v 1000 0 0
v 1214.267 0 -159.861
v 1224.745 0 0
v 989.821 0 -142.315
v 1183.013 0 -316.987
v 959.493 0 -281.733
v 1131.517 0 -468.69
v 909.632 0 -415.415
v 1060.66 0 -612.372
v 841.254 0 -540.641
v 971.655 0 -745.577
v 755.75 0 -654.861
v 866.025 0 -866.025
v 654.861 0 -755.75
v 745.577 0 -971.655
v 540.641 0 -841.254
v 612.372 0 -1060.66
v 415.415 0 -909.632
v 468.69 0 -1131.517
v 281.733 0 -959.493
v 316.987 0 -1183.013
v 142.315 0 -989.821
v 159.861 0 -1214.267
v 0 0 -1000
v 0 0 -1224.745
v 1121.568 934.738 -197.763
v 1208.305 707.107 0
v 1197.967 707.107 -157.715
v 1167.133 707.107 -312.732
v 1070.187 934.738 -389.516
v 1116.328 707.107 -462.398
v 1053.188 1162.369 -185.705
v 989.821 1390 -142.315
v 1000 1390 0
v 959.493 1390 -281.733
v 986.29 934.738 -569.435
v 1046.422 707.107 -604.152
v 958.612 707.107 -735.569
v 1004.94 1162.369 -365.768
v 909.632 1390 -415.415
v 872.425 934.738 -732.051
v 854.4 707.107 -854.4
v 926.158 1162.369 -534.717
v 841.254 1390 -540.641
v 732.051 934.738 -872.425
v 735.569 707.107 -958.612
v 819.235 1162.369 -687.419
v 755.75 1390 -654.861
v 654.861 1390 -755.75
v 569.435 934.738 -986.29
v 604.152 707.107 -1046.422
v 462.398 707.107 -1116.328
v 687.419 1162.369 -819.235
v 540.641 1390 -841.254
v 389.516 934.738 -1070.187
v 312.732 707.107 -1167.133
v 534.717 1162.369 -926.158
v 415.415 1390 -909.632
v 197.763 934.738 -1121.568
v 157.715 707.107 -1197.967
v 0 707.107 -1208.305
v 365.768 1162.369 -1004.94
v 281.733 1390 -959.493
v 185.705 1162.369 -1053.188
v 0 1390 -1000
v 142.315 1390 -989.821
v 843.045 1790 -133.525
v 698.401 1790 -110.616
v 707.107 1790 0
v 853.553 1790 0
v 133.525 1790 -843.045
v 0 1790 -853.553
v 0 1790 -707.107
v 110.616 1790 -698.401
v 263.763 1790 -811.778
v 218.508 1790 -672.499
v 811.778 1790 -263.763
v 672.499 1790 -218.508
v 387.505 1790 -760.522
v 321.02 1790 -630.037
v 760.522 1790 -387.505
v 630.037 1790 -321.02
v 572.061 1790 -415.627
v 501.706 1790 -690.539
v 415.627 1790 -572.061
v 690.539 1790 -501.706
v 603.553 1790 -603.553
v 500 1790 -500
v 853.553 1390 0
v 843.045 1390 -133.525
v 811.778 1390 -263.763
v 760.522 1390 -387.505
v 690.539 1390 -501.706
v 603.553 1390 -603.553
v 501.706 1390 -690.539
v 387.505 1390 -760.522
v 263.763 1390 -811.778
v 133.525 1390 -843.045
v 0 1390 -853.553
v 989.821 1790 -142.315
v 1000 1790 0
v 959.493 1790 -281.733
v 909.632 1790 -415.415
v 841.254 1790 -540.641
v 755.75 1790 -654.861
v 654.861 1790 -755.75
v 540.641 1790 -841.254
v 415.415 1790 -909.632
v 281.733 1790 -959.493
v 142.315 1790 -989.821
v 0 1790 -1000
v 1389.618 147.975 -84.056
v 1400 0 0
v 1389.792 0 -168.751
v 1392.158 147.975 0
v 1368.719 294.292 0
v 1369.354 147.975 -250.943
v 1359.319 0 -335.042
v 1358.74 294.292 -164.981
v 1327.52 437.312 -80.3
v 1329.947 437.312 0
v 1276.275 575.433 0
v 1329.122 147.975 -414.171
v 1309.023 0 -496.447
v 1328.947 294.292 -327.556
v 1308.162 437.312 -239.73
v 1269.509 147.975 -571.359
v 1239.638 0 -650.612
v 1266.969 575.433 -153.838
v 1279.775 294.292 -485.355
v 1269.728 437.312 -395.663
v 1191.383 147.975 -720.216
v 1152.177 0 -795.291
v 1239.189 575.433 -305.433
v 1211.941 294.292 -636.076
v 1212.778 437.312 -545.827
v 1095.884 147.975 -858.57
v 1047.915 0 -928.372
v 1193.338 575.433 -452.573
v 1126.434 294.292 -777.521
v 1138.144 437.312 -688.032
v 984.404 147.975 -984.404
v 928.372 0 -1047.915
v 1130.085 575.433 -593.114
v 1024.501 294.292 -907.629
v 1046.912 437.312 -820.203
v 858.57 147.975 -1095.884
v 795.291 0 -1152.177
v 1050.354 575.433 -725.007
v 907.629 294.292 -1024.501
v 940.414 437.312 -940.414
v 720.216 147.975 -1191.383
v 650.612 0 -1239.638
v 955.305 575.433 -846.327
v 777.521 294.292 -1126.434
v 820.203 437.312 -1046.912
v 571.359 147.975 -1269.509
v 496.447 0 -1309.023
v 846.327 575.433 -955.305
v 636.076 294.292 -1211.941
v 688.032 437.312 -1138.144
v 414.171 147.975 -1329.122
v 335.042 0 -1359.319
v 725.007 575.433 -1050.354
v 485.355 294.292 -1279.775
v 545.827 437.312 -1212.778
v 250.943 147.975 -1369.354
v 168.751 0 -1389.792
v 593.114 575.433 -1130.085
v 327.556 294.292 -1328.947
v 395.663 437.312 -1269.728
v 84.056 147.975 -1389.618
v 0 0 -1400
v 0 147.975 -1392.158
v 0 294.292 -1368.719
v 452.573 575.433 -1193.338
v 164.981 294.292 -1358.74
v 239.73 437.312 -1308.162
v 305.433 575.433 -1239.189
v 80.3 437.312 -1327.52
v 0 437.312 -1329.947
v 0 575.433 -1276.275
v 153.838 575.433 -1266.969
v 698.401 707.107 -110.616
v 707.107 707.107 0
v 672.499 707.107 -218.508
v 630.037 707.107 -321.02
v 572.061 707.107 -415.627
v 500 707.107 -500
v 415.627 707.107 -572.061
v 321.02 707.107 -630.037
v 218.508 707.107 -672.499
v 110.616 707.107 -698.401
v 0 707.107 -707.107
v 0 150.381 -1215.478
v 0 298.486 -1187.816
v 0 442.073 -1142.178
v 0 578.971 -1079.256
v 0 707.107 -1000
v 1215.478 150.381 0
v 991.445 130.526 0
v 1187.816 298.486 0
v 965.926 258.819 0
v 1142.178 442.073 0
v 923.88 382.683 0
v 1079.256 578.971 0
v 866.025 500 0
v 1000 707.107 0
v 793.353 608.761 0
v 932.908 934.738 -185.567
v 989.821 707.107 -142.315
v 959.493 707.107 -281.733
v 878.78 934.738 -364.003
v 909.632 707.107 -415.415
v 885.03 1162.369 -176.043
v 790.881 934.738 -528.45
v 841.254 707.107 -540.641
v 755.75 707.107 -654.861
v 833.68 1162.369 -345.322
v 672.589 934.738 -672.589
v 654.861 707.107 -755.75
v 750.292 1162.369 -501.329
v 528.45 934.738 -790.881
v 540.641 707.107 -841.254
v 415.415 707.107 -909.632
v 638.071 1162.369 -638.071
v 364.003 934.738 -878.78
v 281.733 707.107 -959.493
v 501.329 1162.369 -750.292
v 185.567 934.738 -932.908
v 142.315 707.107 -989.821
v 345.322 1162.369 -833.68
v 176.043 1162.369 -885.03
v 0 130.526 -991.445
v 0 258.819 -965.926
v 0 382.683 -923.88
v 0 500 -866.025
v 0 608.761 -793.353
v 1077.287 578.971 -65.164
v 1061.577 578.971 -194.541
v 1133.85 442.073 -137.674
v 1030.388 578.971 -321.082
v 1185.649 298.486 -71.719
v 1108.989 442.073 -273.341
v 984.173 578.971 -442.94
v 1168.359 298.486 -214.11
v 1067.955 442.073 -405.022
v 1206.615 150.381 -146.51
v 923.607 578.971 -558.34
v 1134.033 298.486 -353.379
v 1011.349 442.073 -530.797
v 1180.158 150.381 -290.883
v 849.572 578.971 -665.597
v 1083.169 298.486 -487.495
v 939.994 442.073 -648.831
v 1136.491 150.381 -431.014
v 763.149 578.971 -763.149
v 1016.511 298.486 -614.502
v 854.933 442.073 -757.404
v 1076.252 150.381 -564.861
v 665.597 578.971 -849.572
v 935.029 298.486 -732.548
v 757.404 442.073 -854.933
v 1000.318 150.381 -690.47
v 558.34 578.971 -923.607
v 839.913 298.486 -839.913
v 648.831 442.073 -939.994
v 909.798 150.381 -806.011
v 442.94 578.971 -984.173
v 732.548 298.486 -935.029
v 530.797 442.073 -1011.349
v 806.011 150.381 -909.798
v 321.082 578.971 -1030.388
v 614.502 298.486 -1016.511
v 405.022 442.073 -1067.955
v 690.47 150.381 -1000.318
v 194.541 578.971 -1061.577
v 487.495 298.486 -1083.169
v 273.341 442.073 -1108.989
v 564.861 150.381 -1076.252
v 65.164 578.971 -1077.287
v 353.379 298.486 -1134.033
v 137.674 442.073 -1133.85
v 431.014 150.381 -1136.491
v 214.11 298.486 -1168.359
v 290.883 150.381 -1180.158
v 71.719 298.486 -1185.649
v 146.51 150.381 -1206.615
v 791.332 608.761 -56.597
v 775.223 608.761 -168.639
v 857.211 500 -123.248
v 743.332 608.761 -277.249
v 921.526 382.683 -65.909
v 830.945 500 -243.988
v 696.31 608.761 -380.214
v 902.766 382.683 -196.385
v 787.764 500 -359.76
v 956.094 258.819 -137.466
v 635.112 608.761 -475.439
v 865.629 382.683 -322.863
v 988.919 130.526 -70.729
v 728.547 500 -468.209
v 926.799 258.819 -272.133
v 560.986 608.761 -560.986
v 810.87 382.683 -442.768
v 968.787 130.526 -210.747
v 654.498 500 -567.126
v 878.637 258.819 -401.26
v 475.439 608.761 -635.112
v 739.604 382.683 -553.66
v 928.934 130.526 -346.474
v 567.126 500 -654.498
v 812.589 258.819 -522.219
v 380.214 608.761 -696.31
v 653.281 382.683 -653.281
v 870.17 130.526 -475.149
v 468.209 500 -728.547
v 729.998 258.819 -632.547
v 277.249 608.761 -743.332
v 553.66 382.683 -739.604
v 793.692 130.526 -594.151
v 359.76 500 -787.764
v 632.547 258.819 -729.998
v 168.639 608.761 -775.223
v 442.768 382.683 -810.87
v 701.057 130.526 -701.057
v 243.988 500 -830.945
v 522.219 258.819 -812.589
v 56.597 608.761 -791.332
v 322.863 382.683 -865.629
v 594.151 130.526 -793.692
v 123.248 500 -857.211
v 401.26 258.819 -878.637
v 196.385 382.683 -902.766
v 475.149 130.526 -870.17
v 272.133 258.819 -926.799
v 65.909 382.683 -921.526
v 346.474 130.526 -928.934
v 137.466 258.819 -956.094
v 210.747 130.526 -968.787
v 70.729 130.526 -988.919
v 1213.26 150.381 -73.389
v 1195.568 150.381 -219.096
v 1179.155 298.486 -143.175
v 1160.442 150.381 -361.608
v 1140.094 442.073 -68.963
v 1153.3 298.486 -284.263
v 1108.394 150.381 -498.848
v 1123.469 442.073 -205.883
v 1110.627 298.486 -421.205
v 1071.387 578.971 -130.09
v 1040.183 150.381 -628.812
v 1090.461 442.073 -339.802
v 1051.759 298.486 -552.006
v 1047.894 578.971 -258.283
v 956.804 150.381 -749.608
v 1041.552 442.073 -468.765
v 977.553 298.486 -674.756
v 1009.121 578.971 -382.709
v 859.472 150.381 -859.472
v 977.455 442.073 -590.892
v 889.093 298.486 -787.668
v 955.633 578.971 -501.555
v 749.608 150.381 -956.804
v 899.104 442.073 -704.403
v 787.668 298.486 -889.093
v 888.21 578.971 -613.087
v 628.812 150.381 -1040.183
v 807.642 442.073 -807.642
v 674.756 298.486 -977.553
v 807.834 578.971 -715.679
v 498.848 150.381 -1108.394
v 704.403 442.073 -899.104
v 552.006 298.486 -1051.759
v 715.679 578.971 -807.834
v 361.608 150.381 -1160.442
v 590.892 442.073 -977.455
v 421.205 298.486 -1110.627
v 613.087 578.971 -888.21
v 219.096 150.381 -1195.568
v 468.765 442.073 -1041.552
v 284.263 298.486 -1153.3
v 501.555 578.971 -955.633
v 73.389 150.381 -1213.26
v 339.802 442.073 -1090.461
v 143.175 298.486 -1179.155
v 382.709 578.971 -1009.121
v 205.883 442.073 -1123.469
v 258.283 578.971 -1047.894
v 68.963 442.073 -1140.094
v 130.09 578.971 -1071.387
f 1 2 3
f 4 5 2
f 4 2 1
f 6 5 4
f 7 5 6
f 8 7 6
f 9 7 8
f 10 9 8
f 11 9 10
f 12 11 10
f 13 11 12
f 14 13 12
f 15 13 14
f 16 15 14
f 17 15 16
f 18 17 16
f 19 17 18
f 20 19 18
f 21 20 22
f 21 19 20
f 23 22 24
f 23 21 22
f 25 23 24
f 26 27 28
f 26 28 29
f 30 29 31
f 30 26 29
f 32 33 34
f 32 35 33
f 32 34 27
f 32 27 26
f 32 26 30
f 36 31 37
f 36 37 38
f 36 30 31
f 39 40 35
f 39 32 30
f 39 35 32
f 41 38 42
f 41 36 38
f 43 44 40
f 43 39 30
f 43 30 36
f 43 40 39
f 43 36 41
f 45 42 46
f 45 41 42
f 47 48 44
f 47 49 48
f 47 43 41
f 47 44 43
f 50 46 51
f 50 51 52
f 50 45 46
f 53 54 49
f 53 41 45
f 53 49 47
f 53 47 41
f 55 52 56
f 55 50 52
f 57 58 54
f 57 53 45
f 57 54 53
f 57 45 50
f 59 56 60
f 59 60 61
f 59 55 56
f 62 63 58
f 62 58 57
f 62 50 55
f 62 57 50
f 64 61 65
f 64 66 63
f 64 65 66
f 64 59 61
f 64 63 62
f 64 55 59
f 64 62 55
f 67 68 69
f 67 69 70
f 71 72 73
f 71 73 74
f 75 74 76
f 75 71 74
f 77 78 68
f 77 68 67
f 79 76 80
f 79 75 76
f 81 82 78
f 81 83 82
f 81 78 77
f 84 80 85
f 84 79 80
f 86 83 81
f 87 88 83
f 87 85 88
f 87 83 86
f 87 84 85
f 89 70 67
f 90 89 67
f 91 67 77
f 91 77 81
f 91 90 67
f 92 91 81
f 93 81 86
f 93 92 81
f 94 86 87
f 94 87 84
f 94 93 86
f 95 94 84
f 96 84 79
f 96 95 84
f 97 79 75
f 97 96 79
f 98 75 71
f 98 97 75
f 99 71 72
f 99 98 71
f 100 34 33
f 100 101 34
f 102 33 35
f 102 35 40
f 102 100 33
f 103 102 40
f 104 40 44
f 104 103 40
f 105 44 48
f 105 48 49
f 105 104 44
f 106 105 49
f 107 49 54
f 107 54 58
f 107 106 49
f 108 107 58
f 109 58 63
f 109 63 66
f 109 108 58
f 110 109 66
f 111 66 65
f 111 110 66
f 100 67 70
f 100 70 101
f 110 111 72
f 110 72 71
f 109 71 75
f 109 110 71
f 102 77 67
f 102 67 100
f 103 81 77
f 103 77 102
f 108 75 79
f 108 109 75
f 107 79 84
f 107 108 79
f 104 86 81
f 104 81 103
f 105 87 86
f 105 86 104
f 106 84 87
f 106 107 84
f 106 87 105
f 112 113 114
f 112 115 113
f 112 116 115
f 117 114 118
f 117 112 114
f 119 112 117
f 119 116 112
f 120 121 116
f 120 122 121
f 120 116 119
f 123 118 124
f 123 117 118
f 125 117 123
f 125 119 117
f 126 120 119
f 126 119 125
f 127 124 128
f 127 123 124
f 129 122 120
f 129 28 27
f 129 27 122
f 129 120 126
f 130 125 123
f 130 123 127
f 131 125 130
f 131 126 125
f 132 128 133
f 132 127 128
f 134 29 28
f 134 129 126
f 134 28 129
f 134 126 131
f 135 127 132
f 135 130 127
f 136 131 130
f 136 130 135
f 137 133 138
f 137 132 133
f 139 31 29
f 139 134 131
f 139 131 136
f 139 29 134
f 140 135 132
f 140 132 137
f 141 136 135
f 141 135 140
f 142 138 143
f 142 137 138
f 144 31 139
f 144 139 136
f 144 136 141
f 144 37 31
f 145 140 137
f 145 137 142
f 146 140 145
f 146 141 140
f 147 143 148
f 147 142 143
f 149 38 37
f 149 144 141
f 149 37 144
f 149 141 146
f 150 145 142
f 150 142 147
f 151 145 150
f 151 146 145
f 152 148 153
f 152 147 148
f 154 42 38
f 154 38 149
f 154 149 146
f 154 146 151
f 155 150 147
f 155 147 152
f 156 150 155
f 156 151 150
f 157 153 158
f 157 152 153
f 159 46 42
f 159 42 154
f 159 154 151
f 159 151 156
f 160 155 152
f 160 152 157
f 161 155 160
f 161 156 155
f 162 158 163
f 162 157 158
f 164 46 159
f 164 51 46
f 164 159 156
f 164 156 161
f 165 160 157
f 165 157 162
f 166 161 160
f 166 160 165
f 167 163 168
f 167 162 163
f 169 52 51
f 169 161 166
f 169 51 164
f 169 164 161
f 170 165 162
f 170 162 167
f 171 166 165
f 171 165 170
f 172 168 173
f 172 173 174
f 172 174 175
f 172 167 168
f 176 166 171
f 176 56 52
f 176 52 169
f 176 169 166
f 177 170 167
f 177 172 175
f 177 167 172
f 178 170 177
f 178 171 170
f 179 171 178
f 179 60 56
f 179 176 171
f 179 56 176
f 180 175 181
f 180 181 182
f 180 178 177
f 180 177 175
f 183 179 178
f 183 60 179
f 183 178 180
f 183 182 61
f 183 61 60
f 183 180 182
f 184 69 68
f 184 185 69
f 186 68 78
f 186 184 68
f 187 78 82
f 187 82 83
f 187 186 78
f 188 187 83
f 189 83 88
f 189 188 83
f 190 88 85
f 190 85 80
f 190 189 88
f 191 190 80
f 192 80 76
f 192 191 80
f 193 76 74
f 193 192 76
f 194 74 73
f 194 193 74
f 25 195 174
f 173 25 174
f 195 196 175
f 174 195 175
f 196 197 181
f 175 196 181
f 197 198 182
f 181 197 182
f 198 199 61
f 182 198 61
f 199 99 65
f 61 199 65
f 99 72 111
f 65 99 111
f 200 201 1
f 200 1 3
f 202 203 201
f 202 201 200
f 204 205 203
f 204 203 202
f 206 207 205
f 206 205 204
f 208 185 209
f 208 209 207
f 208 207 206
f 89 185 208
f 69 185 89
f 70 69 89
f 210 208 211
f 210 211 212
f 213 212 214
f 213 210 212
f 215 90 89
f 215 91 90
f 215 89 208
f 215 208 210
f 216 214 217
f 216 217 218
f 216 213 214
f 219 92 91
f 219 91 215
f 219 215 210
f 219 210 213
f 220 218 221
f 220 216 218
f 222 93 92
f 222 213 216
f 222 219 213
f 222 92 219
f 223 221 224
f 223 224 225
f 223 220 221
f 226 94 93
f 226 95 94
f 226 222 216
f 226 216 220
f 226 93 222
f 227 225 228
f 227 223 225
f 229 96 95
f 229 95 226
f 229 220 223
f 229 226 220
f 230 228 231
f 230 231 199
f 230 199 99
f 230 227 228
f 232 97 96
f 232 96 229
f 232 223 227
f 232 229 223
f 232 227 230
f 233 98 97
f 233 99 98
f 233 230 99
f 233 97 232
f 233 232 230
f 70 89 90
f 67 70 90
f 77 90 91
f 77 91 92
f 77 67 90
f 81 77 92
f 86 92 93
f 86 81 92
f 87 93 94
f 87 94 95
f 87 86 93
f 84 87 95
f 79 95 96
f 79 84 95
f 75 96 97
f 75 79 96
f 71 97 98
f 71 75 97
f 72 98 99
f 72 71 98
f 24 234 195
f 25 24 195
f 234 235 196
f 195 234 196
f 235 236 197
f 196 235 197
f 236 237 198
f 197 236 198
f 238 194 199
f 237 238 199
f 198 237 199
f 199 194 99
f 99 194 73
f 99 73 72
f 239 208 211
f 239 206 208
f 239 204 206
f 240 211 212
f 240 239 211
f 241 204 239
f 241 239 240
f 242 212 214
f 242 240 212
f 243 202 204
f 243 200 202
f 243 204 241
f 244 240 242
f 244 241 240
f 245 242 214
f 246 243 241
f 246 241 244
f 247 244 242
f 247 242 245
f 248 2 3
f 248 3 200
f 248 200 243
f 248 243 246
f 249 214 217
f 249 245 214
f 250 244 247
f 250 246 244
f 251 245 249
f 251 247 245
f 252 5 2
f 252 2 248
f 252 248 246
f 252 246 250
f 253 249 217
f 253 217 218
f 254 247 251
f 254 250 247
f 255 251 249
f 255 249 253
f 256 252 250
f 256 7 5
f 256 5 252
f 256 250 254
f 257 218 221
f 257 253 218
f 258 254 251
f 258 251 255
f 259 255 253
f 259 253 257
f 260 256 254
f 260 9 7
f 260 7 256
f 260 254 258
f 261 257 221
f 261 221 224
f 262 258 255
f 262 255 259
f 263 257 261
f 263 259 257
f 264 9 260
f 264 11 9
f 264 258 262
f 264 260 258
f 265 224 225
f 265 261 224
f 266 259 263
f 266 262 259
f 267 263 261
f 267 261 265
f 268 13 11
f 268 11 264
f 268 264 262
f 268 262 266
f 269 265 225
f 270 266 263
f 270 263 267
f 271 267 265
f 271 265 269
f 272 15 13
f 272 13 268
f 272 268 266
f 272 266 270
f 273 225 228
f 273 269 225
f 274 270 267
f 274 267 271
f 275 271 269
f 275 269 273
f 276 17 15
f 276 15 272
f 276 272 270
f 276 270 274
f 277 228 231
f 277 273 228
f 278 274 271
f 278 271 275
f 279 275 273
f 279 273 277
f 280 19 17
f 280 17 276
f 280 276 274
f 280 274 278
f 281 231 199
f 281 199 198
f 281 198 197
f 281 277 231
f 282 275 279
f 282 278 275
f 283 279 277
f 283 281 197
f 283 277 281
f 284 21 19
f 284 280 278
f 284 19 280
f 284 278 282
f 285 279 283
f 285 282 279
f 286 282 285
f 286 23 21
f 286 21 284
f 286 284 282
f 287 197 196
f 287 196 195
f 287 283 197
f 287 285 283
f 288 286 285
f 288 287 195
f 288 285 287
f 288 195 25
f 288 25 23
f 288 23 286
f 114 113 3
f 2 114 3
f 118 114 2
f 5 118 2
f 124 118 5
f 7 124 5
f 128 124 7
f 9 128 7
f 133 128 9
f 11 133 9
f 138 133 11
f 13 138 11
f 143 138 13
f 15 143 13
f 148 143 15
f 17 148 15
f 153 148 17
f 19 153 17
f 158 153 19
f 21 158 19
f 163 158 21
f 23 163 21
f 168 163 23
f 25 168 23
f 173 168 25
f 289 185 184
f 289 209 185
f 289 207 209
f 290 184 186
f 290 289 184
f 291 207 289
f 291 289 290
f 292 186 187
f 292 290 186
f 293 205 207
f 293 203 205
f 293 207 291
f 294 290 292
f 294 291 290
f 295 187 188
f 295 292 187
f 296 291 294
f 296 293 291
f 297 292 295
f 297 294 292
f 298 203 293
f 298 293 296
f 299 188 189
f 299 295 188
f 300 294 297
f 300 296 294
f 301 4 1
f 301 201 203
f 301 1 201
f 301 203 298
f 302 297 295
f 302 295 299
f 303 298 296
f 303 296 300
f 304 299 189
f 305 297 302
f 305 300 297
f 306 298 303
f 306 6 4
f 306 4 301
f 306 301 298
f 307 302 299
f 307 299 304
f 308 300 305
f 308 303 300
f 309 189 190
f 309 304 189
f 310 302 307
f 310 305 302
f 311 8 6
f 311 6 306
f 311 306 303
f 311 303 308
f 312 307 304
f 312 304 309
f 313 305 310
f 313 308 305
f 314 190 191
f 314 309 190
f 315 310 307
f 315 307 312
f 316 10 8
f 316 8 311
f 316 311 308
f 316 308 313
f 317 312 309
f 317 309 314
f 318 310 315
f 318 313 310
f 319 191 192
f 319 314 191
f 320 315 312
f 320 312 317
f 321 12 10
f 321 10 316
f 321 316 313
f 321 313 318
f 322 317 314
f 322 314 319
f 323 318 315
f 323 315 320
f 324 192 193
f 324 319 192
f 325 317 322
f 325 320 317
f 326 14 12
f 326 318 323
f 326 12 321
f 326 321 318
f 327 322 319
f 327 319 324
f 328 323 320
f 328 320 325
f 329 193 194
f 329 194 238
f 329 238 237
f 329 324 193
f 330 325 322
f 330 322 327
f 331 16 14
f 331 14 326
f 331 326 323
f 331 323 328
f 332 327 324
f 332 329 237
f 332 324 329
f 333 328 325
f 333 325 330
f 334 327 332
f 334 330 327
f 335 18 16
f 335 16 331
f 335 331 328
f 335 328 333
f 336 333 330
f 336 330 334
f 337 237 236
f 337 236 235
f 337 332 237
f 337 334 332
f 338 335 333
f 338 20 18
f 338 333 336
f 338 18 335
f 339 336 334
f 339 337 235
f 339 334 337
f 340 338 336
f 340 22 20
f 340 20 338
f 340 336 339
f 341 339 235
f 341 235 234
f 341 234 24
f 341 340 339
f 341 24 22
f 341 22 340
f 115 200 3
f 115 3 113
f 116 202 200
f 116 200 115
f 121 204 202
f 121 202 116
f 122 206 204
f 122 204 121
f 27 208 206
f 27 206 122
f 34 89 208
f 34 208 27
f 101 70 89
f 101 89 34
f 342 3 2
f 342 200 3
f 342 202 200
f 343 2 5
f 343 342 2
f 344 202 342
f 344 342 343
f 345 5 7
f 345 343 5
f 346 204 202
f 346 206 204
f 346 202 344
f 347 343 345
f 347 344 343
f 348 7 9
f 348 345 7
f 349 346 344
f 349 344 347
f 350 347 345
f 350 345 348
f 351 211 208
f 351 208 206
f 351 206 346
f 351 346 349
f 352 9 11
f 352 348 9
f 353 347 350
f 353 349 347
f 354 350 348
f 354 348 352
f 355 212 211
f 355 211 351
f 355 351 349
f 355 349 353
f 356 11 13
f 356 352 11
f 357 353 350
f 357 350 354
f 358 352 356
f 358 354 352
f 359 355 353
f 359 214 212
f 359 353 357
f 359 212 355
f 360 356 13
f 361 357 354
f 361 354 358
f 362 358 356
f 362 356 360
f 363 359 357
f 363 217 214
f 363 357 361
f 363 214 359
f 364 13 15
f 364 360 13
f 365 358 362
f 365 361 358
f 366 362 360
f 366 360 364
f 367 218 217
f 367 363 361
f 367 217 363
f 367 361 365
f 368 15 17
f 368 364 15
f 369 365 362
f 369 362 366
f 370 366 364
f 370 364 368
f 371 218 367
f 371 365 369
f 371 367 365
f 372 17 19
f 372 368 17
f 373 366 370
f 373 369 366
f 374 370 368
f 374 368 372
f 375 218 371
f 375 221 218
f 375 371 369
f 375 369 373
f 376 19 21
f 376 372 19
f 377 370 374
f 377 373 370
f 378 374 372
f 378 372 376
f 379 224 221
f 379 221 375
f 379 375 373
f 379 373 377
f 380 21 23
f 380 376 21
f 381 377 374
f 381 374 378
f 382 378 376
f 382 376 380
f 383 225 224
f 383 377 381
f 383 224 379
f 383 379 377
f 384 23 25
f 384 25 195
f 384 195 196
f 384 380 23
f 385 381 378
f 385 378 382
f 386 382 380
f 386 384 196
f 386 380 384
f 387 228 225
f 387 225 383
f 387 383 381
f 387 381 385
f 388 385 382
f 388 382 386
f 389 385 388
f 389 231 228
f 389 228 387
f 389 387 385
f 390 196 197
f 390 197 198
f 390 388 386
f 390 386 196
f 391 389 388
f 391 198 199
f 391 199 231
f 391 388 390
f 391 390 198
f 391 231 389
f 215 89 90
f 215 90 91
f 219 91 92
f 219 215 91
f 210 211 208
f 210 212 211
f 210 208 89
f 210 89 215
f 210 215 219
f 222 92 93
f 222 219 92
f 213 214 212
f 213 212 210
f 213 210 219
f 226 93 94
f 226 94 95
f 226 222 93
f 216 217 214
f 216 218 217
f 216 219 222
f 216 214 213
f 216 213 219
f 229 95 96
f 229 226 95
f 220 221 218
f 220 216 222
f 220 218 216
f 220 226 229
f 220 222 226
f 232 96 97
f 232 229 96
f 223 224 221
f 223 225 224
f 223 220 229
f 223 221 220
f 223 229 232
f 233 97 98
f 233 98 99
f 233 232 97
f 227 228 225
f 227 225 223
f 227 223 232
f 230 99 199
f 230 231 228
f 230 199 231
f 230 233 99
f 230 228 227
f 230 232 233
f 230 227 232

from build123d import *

# Parameters (mm, degrees)
REVOLVE2_ANGLE = 90
REVOLVE3_ANGLE = 90


with BuildPart() as part:
    # Sketch1 → Revolve2 (revolve)
    with BuildSketch(Plane.XY):
        with BuildLine():
            Line((707.106781187, 1790), (707.106781187, 707.106781187))
            ThreePointArc((707.106781187, 707.106781187), (923.879532511, 382.683432365), (1000, 0))
            Line((1000, 0), (1224.744871392, 0))
            ThreePointArc((1224.744871392, 0), (1167.207109169, 370.981892151), (1000, 707.106781187))
            Line((1000, 707.106781187), (853.553390593, 1390))
            Line((853.553390593, 1390), (853.553390593, 1790))
            Line((853.553390593, 1790), (707.106781187, 1790))
        make_face()
    revolve(axis=Axis((0, 355.703332398, 0), (0, 1, 0)), revolution_arc=REVOLVE2_ANGLE)


with BuildPart() as body_2:
    # Sketch1<4> → Revolve3 (revolve)
    with BuildSketch(Plane.XY):
        with BuildLine():
            Line((1000, 1790), (853.553390593, 1790))
            Line((853.553390593, 1790), (853.553390593, 1390))
            Line((853.553390593, 1390), (1000, 707.106781187))
            ThreePointArc((1000, 707.106781187), (1167.207109169, 370.981892151), (1224.744871392, 0))
            Line((1224.744871392, 0), (1400, 0))
            ThreePointArc((1400, 0), (1351.22656063, 366.315140075), (1208.304597359, 707.106781187))
            Line((1208.304597359, 707.106781187), (1000, 1390))
            Line((1000, 1390), (1000, 1790))
        make_face()
    revolve(axis=Axis((0, 355.703332398, 0), (0, 1, 0)), revolution_arc=REVOLVE3_ANGLE)


solid = Compound([part.part, body_2.part])
